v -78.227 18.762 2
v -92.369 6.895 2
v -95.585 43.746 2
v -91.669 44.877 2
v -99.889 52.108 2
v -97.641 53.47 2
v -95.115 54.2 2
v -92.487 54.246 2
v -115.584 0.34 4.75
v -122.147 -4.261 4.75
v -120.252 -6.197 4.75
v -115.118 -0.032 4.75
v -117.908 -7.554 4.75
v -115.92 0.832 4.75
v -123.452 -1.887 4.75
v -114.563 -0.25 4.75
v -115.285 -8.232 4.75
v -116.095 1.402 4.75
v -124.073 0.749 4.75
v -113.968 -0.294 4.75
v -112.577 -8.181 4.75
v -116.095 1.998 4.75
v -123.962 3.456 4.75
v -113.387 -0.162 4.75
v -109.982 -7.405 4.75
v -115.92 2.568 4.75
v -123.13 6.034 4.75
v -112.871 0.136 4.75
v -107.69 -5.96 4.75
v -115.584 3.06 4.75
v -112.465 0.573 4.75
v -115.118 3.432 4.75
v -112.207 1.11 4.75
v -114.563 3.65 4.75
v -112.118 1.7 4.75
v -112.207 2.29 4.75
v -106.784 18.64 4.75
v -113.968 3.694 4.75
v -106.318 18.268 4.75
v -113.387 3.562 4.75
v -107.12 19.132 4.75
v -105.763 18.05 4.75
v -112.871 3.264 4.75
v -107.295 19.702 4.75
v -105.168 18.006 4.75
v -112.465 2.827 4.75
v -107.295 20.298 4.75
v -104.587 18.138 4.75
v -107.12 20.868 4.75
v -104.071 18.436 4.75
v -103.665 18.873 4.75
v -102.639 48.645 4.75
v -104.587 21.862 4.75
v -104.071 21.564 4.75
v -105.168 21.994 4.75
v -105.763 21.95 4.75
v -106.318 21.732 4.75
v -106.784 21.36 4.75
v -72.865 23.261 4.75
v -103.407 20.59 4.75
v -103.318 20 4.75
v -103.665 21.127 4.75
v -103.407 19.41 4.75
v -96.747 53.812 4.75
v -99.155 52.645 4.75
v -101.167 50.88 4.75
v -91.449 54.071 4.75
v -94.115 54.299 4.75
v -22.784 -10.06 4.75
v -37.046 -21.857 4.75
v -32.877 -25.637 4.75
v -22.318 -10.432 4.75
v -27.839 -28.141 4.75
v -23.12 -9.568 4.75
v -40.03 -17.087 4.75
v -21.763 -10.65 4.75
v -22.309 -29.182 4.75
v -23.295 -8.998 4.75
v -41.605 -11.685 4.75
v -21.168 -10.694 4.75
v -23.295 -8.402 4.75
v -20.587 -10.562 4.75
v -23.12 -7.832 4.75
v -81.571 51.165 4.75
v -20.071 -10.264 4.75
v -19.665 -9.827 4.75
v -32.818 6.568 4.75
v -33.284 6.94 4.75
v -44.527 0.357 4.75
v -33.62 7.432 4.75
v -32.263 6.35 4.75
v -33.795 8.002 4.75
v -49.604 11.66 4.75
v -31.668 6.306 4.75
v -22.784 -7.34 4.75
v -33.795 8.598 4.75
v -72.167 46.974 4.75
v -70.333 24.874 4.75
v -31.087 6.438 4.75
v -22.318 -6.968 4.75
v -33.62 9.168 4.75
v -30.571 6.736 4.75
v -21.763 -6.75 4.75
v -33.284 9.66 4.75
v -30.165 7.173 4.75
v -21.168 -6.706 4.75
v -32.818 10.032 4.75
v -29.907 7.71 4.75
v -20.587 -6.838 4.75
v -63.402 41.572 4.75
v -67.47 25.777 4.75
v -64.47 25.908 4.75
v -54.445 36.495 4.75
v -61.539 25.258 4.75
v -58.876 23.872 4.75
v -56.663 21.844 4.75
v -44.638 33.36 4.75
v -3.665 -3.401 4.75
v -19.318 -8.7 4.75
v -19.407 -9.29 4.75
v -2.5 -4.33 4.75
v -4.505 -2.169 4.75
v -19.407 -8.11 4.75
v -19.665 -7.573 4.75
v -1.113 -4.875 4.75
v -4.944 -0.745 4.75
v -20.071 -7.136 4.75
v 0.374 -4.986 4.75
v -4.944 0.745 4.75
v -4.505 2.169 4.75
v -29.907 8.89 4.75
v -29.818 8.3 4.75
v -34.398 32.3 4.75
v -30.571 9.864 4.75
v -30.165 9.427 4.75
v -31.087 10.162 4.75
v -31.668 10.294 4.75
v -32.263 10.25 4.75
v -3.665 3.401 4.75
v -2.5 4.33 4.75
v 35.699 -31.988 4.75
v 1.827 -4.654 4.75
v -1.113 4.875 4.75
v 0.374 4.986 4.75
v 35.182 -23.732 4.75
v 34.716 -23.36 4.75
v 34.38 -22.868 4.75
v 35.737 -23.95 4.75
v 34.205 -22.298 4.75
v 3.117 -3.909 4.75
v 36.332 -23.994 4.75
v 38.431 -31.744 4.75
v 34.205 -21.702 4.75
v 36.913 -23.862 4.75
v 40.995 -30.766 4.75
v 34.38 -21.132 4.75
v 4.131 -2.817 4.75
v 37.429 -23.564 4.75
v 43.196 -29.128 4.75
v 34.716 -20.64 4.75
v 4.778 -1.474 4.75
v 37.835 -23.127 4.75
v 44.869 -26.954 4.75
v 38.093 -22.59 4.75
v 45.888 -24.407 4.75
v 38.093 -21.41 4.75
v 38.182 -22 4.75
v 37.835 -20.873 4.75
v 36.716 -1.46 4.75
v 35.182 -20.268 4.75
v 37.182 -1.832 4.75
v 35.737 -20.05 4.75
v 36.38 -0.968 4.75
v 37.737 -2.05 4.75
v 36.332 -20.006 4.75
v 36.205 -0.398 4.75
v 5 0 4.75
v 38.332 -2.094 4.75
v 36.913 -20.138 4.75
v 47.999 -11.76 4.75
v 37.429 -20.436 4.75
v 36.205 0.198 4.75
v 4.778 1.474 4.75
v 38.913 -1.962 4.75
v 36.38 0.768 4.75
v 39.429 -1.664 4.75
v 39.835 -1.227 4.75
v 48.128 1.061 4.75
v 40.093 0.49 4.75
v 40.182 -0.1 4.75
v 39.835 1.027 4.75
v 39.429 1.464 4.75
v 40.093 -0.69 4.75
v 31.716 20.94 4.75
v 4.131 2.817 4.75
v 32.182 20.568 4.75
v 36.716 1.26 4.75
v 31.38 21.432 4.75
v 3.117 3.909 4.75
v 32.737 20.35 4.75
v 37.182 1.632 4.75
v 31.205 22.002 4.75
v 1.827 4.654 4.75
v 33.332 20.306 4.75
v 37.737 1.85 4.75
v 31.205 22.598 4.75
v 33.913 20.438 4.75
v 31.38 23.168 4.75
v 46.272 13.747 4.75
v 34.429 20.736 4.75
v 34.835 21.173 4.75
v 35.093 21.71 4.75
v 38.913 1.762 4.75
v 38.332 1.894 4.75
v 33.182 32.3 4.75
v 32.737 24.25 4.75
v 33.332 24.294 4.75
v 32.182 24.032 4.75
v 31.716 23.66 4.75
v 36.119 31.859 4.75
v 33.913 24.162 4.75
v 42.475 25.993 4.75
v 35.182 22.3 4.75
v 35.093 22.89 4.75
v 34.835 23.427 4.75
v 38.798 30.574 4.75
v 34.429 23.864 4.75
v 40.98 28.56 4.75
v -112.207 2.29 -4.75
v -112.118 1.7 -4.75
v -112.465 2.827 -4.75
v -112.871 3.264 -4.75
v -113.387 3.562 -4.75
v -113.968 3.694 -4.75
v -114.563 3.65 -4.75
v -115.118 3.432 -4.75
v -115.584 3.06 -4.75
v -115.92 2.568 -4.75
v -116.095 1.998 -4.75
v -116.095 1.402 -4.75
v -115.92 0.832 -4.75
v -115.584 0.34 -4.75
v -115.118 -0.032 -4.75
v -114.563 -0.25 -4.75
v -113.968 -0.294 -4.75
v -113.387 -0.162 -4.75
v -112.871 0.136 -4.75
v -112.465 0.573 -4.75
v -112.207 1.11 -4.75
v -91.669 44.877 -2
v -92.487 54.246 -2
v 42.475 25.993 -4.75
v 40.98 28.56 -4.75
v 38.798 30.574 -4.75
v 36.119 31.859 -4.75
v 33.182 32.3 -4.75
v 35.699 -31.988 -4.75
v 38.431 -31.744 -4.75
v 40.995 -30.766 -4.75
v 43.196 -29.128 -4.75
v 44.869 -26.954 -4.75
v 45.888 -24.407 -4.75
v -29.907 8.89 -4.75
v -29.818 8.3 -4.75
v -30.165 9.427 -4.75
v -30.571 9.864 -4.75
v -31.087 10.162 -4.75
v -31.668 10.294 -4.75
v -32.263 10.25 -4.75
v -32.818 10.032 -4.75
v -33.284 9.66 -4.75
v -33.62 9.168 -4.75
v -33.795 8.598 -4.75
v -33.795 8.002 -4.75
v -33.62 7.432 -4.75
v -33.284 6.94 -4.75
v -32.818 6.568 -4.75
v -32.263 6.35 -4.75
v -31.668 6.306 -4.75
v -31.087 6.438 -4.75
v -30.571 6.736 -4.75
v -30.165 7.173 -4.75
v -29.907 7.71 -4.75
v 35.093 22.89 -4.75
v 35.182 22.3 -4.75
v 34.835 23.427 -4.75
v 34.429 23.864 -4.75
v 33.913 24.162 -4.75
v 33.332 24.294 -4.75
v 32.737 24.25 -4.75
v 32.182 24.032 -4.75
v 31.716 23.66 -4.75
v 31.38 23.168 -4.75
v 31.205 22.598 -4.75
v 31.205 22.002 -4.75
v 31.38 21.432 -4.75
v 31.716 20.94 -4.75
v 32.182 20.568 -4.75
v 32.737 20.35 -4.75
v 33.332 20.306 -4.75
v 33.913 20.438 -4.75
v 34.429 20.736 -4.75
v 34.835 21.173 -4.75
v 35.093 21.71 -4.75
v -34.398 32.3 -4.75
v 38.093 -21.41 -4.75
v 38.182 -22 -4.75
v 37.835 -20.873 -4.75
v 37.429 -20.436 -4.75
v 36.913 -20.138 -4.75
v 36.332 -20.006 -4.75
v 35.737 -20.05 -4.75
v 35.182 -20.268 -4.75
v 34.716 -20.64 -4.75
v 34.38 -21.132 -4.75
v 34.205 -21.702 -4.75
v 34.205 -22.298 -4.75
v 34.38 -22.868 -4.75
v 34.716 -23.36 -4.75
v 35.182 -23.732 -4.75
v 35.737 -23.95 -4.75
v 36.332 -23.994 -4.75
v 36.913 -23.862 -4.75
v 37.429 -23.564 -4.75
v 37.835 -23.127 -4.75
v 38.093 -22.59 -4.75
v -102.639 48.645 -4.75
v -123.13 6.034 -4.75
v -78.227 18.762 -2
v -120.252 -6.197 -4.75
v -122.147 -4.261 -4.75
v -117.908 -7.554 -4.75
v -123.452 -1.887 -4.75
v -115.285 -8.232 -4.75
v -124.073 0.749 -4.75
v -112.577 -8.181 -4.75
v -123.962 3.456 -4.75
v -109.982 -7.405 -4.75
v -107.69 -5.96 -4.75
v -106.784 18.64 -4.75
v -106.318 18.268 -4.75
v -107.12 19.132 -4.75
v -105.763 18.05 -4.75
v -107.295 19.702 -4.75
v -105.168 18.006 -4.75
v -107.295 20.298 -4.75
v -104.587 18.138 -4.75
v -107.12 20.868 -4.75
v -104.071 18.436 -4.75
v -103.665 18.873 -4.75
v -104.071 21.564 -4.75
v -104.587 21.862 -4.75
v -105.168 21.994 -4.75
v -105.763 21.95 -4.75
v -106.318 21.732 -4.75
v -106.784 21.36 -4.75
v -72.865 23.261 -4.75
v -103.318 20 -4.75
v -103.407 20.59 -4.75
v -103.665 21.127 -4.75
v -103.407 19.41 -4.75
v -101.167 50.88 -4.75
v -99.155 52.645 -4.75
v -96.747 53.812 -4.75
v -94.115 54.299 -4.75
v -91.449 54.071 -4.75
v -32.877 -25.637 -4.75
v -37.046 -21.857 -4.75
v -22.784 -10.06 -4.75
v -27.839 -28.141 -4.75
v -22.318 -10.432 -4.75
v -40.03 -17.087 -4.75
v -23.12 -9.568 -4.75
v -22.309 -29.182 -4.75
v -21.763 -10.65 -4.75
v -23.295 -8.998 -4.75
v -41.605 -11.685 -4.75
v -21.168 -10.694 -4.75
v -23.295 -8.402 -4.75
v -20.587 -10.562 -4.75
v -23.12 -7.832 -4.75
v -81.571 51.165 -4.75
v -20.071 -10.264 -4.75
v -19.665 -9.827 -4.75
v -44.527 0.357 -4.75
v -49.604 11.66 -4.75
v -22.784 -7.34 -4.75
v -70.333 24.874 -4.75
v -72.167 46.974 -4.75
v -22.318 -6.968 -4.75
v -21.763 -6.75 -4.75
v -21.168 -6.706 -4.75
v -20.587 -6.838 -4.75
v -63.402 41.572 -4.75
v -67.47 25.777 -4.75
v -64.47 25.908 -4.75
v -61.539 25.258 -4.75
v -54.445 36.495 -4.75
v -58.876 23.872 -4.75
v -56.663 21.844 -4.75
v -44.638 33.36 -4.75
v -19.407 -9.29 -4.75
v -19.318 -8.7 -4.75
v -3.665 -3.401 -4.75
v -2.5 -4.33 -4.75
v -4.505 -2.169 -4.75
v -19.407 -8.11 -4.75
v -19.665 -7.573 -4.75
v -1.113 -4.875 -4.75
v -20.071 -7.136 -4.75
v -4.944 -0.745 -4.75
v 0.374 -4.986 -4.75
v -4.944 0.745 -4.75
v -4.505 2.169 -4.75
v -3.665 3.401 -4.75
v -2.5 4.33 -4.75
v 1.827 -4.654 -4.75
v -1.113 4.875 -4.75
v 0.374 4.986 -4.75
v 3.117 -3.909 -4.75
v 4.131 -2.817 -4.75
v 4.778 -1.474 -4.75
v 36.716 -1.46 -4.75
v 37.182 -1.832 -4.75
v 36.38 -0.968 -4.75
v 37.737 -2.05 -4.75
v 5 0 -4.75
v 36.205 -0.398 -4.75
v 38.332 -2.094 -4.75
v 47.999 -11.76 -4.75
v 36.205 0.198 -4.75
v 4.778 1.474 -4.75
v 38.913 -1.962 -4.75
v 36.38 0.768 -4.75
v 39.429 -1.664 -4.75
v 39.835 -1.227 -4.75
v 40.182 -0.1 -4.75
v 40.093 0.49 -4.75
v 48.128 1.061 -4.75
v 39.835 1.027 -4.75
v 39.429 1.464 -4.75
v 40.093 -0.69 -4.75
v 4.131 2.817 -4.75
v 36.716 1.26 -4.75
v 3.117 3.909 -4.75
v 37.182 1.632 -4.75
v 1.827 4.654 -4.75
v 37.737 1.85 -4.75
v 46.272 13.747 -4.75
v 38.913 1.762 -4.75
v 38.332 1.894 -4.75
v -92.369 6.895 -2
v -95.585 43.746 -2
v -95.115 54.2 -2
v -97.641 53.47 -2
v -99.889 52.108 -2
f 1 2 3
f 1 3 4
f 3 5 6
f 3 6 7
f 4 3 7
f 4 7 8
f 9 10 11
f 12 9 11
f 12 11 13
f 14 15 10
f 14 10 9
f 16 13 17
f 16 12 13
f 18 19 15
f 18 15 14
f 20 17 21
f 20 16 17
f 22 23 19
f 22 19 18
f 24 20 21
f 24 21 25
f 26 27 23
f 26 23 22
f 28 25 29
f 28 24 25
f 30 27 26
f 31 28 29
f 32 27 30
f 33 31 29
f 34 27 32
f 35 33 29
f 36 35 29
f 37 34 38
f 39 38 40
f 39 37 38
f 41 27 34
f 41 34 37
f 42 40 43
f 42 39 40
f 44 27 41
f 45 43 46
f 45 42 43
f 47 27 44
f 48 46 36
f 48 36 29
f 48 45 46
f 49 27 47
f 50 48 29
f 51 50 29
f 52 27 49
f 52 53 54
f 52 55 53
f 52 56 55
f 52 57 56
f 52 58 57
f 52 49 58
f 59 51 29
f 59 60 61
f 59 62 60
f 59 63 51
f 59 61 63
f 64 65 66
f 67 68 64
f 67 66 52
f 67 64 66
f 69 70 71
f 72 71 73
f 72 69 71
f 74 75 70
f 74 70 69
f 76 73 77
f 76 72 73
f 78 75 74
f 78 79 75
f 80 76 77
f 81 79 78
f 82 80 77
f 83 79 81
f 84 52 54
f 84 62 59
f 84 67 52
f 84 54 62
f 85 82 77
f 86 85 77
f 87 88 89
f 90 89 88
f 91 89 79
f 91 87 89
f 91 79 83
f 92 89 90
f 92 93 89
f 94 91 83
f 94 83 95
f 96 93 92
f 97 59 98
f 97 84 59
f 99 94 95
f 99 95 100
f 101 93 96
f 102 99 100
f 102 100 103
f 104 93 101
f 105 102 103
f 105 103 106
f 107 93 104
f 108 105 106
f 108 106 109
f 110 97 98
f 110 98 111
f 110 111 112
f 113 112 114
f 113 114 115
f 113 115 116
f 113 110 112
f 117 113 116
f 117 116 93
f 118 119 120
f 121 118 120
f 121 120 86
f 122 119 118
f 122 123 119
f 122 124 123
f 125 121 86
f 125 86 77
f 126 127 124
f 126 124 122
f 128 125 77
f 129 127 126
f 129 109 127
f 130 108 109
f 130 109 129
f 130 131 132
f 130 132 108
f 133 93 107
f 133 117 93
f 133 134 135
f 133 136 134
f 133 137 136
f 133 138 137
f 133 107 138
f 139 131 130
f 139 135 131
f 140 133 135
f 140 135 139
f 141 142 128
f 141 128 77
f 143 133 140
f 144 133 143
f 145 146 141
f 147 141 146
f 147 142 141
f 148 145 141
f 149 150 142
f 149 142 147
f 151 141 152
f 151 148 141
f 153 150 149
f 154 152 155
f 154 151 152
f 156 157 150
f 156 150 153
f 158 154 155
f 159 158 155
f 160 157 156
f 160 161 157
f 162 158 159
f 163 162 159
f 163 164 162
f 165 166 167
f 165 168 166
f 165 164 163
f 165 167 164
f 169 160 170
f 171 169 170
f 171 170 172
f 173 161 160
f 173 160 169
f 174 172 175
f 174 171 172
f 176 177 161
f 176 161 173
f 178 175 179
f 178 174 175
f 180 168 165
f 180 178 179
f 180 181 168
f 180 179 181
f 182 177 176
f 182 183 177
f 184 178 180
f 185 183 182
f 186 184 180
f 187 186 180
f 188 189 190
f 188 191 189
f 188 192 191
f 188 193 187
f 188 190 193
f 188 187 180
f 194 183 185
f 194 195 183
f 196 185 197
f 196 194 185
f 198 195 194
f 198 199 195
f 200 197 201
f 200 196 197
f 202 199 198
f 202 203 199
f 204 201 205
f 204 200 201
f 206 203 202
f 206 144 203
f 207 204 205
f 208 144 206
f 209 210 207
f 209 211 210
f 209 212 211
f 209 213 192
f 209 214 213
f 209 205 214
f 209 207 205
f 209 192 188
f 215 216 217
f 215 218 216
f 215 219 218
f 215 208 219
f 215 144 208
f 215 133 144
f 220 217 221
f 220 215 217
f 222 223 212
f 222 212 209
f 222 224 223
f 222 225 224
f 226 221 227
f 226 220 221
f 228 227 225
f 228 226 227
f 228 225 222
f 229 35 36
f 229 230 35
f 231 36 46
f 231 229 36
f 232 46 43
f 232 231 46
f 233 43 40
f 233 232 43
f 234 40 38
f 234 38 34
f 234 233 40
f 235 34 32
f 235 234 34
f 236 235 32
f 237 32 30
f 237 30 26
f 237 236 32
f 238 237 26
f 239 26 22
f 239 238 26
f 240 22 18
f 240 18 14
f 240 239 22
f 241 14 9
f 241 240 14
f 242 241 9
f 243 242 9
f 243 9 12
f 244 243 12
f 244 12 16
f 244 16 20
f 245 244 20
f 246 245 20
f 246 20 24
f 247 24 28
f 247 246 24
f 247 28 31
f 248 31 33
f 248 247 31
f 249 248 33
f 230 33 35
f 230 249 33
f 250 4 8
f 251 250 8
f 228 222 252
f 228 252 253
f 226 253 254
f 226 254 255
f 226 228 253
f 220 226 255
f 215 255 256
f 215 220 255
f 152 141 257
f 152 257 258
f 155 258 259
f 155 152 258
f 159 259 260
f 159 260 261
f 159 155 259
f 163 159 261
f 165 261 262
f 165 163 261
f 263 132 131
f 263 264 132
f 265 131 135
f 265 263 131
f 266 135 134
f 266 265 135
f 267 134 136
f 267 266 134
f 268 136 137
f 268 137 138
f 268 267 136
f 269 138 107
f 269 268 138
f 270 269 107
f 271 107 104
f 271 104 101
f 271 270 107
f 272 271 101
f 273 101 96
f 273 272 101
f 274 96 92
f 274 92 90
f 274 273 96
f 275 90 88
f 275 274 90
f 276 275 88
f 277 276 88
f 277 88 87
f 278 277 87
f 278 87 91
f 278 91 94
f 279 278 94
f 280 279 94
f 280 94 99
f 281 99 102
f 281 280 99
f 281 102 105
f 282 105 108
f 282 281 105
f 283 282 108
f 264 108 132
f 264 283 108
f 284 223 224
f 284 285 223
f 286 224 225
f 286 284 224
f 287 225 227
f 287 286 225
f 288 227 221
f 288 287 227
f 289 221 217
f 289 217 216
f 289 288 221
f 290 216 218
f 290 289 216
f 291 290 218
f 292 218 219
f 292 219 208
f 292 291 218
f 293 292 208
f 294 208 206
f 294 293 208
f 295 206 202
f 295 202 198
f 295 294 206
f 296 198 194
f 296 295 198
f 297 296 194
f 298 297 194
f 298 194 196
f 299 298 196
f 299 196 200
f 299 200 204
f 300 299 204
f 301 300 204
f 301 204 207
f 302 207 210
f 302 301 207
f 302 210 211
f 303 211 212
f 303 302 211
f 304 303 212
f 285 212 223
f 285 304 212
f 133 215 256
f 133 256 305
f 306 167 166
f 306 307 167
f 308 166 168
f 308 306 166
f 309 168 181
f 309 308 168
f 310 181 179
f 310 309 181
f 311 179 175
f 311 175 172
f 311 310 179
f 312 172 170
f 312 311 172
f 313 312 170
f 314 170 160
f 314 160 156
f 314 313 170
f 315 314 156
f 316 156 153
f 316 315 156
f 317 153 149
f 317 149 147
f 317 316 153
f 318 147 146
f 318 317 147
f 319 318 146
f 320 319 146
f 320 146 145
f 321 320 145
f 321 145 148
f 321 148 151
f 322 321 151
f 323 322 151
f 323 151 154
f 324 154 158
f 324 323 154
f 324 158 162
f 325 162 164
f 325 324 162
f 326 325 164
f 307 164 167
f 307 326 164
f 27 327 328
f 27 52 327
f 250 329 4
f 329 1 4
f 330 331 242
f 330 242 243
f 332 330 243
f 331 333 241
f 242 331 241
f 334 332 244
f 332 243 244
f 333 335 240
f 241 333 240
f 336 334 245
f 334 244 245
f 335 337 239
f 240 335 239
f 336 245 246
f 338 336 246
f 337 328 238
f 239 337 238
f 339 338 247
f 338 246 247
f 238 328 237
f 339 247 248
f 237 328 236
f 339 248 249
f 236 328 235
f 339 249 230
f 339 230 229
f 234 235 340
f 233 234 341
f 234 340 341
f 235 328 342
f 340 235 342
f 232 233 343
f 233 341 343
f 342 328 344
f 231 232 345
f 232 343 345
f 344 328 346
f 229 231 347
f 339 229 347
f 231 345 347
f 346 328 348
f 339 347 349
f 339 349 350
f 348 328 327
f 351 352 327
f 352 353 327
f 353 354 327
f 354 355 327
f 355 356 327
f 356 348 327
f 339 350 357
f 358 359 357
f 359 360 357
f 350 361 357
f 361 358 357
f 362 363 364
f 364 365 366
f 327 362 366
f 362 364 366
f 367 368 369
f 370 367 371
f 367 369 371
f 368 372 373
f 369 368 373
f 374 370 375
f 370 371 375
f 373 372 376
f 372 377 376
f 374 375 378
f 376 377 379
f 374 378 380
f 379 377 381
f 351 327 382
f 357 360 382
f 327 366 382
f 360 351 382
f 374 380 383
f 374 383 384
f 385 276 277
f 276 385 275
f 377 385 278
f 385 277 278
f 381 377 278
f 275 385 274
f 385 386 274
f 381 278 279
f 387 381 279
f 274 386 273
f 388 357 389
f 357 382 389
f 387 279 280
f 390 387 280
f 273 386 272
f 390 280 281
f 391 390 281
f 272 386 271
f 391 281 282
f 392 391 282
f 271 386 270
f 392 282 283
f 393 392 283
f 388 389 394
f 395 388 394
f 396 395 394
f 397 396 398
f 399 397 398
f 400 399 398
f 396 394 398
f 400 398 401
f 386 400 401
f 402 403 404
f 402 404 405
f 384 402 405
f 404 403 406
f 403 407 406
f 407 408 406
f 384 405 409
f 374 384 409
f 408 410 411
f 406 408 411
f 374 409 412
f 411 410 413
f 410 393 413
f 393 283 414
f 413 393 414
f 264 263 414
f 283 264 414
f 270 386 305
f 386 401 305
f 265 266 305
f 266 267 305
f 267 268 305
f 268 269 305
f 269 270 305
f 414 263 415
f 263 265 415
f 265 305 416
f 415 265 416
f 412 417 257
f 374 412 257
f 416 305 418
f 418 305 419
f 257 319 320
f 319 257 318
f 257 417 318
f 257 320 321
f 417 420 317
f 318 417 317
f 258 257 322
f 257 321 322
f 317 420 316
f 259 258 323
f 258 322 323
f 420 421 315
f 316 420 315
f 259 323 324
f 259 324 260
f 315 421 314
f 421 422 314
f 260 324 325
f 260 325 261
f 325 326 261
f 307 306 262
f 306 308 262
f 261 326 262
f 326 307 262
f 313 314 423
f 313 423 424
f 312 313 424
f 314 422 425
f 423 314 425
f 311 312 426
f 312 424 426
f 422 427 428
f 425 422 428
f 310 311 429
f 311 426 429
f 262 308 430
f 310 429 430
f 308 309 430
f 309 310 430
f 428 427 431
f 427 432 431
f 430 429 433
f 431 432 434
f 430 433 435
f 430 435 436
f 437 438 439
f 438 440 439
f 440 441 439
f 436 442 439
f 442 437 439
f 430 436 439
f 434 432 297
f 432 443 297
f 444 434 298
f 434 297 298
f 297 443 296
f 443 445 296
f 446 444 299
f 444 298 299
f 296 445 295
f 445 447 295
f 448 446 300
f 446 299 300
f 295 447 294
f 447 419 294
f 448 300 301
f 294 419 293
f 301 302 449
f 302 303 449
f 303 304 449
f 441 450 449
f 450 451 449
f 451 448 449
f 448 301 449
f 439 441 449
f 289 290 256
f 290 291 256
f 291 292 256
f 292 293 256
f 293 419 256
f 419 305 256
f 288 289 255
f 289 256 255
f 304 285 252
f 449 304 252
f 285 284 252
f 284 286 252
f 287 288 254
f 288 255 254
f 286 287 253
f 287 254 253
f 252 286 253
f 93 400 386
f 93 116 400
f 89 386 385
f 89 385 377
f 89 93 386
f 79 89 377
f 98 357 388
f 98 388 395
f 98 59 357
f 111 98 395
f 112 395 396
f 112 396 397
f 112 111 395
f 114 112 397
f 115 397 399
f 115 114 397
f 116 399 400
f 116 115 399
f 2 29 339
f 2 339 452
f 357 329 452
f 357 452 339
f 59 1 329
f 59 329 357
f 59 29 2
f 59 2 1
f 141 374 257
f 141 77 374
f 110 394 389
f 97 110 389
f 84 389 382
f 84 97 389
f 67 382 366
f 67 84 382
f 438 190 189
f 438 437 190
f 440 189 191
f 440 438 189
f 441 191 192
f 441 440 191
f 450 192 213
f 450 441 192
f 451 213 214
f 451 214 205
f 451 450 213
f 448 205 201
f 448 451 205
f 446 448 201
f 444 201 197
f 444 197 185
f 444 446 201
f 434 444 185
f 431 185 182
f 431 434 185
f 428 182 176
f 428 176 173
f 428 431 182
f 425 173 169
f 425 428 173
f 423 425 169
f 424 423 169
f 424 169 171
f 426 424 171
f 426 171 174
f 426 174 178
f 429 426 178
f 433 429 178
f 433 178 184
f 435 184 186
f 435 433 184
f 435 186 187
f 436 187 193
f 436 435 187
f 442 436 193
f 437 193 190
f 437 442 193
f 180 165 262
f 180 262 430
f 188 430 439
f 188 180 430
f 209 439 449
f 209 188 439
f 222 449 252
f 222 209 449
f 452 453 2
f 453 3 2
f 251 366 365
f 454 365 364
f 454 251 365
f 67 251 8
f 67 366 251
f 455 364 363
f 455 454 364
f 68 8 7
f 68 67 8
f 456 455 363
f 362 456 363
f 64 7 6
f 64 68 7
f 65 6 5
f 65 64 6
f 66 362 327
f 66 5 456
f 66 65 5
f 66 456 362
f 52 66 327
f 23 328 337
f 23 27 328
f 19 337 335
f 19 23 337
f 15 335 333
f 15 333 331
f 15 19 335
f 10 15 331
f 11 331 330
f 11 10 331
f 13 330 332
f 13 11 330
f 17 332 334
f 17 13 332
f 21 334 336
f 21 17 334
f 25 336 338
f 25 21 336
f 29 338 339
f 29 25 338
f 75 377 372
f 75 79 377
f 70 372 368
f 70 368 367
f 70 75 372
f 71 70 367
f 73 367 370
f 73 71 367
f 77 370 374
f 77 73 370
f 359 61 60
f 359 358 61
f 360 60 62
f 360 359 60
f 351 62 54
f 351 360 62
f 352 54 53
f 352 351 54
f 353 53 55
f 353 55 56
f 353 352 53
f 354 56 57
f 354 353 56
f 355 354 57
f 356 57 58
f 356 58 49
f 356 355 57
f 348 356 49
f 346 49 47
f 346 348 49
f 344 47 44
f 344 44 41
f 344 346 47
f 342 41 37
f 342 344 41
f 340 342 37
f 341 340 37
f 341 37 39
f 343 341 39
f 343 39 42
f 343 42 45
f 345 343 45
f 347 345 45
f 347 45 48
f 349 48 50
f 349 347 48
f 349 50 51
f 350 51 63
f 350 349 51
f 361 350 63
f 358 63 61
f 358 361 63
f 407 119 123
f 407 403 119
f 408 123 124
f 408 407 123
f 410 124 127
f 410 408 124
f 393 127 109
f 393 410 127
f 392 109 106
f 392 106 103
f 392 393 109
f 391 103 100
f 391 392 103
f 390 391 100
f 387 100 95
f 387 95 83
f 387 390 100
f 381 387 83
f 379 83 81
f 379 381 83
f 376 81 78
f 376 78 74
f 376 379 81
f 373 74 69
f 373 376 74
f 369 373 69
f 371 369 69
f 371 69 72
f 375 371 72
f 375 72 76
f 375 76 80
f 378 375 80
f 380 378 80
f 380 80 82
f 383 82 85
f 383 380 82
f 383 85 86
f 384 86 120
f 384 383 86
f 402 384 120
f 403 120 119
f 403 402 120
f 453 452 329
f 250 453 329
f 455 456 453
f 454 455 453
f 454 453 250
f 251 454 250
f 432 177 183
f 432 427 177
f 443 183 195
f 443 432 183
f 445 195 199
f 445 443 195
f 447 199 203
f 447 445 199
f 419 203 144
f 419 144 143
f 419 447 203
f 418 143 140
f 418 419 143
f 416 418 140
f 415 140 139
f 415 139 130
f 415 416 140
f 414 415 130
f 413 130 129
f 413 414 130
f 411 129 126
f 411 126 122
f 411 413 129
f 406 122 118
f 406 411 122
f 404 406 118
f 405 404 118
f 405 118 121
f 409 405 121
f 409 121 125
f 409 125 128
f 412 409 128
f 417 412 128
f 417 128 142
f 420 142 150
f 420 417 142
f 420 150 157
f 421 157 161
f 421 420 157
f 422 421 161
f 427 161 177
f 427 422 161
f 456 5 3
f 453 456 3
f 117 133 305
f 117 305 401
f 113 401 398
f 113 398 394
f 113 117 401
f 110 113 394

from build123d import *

# Parameters (mm, degrees)
SKETCH1_R           = 5
SKETCH1_R_2         = 2
BOSS_EXTRUDE1_DEPTH = 4.75
CUT_EXTRUDE1_DEPTH  = 2


with BuildPart() as part:
    # Sketch1 → Boss-Extrude1 (new, symmetric)
    with BuildSketch(Plane.XY):
        with BuildLine():
            Line((-22.308767332, -29.181670657), (35.698943118, -31.988315456))
            ThreePointArc((35.698943118, -31.988315456), (42.1516901, -30.02280497), (45.888257007, -24.406823948))
            ThreePointArc((45.888257007, -24.406823948), (48.128157677, 1.060560267), (42.475146865, 25.993435805))
            ThreePointArc((42.475146865, 25.993435805), (38.797626972, 30.574489653), (33.182217728, 32.3))
            Line((33.182217728, 32.3), (-34.397529085, 32.3))
            ThreePointArc((-34.397529085, 32.3), (-49.622555092, 34.67439152), (-63.401574193, 41.572056677))
            ThreePointArc((-63.401574193, 41.572056677), (-76.799263642, 49.225759558), (-91.448521696, 54.071013816))
            ThreePointArc((-91.448521696, 54.071013816), (-97.990041102, 53.309279516), (-102.639296293, 48.644931604))
            Line((-102.639296293, 48.644931604), (-123.129936653, 6.033713582))
            ThreePointArc((-123.129936653, 6.033713582), (-120.252485213, -6.197177966), (-107.689906175, -5.960444431))
            Line((-107.689906175, -5.960444431), (-72.864818345, 23.261273923))
            ThreePointArc((-72.864818345, 23.261273923), (-64.470178387, 25.908093735), (-56.662687309, 21.843771132))
            ThreePointArc((-56.662687309, 21.843771132), (-46.805355693, 6.125218695), (-41.605017691, -11.684788659))
            ThreePointArc((-41.605017691, -11.684788659), (-35.091884298, -23.890622031), (-22.308767332, -29.181670657))
        make_face()
        Circle(SKETCH1_R, mode=Mode.SUBTRACT)
        with Locations((36.182217728, -22)):
            Circle(SKETCH1_R_2, mode=Mode.SUBTRACT)
        with Locations((-21.317782272, -8.7)):
            Circle(SKETCH1_R_2, mode=Mode.SUBTRACT)
        with Locations((38.182217728, -0.1)):
            Circle(SKETCH1_R_2, mode=Mode.SUBTRACT)
        with Locations((33.182217728, 22.3)):
            Circle(SKETCH1_R_2, mode=Mode.SUBTRACT)
        with Locations((-31.817782272, 8.3)):
            Circle(SKETCH1_R_2, mode=Mode.SUBTRACT)
        with Locations((-105.317782272, 20)):
            Circle(SKETCH1_R_2, mode=Mode.SUBTRACT)
        with Locations((-114.117782272, 1.7)):
            Circle(SKETCH1_R_2, mode=Mode.SUBTRACT)
    extrude(amount=BOSS_EXTRUDE1_DEPTH, both=True)

    # Sketch2 → Cut-Extrude1 (cut, symmetric)
    with BuildSketch(Plane.XY):
        with BuildLine():
            Line((-78.227129447, 18.761760655), (-91.668909505, 44.876871439))
            Line((-91.668909505, 44.876871439), (-92.486661389, 54.245970368))
            ThreePointArc((-92.486661389, 54.245970368), (-96.402275052, 53.918435936), (-99.889427329, 52.10761343))
            Line((-99.889427329, 52.10761343), (-95.58537432, 43.745564604))
            Line((-95.58537432, 43.745564604), (-92.369017313, 6.895307763))
            Line((-92.369017313, 6.895307763), (-78.227129447, 18.761760655))
        make_face()
    extrude(amount=CUT_EXTRUDE1_DEPTH, both=True, mode=Mode.SUBTRACT)


solid = part.part
